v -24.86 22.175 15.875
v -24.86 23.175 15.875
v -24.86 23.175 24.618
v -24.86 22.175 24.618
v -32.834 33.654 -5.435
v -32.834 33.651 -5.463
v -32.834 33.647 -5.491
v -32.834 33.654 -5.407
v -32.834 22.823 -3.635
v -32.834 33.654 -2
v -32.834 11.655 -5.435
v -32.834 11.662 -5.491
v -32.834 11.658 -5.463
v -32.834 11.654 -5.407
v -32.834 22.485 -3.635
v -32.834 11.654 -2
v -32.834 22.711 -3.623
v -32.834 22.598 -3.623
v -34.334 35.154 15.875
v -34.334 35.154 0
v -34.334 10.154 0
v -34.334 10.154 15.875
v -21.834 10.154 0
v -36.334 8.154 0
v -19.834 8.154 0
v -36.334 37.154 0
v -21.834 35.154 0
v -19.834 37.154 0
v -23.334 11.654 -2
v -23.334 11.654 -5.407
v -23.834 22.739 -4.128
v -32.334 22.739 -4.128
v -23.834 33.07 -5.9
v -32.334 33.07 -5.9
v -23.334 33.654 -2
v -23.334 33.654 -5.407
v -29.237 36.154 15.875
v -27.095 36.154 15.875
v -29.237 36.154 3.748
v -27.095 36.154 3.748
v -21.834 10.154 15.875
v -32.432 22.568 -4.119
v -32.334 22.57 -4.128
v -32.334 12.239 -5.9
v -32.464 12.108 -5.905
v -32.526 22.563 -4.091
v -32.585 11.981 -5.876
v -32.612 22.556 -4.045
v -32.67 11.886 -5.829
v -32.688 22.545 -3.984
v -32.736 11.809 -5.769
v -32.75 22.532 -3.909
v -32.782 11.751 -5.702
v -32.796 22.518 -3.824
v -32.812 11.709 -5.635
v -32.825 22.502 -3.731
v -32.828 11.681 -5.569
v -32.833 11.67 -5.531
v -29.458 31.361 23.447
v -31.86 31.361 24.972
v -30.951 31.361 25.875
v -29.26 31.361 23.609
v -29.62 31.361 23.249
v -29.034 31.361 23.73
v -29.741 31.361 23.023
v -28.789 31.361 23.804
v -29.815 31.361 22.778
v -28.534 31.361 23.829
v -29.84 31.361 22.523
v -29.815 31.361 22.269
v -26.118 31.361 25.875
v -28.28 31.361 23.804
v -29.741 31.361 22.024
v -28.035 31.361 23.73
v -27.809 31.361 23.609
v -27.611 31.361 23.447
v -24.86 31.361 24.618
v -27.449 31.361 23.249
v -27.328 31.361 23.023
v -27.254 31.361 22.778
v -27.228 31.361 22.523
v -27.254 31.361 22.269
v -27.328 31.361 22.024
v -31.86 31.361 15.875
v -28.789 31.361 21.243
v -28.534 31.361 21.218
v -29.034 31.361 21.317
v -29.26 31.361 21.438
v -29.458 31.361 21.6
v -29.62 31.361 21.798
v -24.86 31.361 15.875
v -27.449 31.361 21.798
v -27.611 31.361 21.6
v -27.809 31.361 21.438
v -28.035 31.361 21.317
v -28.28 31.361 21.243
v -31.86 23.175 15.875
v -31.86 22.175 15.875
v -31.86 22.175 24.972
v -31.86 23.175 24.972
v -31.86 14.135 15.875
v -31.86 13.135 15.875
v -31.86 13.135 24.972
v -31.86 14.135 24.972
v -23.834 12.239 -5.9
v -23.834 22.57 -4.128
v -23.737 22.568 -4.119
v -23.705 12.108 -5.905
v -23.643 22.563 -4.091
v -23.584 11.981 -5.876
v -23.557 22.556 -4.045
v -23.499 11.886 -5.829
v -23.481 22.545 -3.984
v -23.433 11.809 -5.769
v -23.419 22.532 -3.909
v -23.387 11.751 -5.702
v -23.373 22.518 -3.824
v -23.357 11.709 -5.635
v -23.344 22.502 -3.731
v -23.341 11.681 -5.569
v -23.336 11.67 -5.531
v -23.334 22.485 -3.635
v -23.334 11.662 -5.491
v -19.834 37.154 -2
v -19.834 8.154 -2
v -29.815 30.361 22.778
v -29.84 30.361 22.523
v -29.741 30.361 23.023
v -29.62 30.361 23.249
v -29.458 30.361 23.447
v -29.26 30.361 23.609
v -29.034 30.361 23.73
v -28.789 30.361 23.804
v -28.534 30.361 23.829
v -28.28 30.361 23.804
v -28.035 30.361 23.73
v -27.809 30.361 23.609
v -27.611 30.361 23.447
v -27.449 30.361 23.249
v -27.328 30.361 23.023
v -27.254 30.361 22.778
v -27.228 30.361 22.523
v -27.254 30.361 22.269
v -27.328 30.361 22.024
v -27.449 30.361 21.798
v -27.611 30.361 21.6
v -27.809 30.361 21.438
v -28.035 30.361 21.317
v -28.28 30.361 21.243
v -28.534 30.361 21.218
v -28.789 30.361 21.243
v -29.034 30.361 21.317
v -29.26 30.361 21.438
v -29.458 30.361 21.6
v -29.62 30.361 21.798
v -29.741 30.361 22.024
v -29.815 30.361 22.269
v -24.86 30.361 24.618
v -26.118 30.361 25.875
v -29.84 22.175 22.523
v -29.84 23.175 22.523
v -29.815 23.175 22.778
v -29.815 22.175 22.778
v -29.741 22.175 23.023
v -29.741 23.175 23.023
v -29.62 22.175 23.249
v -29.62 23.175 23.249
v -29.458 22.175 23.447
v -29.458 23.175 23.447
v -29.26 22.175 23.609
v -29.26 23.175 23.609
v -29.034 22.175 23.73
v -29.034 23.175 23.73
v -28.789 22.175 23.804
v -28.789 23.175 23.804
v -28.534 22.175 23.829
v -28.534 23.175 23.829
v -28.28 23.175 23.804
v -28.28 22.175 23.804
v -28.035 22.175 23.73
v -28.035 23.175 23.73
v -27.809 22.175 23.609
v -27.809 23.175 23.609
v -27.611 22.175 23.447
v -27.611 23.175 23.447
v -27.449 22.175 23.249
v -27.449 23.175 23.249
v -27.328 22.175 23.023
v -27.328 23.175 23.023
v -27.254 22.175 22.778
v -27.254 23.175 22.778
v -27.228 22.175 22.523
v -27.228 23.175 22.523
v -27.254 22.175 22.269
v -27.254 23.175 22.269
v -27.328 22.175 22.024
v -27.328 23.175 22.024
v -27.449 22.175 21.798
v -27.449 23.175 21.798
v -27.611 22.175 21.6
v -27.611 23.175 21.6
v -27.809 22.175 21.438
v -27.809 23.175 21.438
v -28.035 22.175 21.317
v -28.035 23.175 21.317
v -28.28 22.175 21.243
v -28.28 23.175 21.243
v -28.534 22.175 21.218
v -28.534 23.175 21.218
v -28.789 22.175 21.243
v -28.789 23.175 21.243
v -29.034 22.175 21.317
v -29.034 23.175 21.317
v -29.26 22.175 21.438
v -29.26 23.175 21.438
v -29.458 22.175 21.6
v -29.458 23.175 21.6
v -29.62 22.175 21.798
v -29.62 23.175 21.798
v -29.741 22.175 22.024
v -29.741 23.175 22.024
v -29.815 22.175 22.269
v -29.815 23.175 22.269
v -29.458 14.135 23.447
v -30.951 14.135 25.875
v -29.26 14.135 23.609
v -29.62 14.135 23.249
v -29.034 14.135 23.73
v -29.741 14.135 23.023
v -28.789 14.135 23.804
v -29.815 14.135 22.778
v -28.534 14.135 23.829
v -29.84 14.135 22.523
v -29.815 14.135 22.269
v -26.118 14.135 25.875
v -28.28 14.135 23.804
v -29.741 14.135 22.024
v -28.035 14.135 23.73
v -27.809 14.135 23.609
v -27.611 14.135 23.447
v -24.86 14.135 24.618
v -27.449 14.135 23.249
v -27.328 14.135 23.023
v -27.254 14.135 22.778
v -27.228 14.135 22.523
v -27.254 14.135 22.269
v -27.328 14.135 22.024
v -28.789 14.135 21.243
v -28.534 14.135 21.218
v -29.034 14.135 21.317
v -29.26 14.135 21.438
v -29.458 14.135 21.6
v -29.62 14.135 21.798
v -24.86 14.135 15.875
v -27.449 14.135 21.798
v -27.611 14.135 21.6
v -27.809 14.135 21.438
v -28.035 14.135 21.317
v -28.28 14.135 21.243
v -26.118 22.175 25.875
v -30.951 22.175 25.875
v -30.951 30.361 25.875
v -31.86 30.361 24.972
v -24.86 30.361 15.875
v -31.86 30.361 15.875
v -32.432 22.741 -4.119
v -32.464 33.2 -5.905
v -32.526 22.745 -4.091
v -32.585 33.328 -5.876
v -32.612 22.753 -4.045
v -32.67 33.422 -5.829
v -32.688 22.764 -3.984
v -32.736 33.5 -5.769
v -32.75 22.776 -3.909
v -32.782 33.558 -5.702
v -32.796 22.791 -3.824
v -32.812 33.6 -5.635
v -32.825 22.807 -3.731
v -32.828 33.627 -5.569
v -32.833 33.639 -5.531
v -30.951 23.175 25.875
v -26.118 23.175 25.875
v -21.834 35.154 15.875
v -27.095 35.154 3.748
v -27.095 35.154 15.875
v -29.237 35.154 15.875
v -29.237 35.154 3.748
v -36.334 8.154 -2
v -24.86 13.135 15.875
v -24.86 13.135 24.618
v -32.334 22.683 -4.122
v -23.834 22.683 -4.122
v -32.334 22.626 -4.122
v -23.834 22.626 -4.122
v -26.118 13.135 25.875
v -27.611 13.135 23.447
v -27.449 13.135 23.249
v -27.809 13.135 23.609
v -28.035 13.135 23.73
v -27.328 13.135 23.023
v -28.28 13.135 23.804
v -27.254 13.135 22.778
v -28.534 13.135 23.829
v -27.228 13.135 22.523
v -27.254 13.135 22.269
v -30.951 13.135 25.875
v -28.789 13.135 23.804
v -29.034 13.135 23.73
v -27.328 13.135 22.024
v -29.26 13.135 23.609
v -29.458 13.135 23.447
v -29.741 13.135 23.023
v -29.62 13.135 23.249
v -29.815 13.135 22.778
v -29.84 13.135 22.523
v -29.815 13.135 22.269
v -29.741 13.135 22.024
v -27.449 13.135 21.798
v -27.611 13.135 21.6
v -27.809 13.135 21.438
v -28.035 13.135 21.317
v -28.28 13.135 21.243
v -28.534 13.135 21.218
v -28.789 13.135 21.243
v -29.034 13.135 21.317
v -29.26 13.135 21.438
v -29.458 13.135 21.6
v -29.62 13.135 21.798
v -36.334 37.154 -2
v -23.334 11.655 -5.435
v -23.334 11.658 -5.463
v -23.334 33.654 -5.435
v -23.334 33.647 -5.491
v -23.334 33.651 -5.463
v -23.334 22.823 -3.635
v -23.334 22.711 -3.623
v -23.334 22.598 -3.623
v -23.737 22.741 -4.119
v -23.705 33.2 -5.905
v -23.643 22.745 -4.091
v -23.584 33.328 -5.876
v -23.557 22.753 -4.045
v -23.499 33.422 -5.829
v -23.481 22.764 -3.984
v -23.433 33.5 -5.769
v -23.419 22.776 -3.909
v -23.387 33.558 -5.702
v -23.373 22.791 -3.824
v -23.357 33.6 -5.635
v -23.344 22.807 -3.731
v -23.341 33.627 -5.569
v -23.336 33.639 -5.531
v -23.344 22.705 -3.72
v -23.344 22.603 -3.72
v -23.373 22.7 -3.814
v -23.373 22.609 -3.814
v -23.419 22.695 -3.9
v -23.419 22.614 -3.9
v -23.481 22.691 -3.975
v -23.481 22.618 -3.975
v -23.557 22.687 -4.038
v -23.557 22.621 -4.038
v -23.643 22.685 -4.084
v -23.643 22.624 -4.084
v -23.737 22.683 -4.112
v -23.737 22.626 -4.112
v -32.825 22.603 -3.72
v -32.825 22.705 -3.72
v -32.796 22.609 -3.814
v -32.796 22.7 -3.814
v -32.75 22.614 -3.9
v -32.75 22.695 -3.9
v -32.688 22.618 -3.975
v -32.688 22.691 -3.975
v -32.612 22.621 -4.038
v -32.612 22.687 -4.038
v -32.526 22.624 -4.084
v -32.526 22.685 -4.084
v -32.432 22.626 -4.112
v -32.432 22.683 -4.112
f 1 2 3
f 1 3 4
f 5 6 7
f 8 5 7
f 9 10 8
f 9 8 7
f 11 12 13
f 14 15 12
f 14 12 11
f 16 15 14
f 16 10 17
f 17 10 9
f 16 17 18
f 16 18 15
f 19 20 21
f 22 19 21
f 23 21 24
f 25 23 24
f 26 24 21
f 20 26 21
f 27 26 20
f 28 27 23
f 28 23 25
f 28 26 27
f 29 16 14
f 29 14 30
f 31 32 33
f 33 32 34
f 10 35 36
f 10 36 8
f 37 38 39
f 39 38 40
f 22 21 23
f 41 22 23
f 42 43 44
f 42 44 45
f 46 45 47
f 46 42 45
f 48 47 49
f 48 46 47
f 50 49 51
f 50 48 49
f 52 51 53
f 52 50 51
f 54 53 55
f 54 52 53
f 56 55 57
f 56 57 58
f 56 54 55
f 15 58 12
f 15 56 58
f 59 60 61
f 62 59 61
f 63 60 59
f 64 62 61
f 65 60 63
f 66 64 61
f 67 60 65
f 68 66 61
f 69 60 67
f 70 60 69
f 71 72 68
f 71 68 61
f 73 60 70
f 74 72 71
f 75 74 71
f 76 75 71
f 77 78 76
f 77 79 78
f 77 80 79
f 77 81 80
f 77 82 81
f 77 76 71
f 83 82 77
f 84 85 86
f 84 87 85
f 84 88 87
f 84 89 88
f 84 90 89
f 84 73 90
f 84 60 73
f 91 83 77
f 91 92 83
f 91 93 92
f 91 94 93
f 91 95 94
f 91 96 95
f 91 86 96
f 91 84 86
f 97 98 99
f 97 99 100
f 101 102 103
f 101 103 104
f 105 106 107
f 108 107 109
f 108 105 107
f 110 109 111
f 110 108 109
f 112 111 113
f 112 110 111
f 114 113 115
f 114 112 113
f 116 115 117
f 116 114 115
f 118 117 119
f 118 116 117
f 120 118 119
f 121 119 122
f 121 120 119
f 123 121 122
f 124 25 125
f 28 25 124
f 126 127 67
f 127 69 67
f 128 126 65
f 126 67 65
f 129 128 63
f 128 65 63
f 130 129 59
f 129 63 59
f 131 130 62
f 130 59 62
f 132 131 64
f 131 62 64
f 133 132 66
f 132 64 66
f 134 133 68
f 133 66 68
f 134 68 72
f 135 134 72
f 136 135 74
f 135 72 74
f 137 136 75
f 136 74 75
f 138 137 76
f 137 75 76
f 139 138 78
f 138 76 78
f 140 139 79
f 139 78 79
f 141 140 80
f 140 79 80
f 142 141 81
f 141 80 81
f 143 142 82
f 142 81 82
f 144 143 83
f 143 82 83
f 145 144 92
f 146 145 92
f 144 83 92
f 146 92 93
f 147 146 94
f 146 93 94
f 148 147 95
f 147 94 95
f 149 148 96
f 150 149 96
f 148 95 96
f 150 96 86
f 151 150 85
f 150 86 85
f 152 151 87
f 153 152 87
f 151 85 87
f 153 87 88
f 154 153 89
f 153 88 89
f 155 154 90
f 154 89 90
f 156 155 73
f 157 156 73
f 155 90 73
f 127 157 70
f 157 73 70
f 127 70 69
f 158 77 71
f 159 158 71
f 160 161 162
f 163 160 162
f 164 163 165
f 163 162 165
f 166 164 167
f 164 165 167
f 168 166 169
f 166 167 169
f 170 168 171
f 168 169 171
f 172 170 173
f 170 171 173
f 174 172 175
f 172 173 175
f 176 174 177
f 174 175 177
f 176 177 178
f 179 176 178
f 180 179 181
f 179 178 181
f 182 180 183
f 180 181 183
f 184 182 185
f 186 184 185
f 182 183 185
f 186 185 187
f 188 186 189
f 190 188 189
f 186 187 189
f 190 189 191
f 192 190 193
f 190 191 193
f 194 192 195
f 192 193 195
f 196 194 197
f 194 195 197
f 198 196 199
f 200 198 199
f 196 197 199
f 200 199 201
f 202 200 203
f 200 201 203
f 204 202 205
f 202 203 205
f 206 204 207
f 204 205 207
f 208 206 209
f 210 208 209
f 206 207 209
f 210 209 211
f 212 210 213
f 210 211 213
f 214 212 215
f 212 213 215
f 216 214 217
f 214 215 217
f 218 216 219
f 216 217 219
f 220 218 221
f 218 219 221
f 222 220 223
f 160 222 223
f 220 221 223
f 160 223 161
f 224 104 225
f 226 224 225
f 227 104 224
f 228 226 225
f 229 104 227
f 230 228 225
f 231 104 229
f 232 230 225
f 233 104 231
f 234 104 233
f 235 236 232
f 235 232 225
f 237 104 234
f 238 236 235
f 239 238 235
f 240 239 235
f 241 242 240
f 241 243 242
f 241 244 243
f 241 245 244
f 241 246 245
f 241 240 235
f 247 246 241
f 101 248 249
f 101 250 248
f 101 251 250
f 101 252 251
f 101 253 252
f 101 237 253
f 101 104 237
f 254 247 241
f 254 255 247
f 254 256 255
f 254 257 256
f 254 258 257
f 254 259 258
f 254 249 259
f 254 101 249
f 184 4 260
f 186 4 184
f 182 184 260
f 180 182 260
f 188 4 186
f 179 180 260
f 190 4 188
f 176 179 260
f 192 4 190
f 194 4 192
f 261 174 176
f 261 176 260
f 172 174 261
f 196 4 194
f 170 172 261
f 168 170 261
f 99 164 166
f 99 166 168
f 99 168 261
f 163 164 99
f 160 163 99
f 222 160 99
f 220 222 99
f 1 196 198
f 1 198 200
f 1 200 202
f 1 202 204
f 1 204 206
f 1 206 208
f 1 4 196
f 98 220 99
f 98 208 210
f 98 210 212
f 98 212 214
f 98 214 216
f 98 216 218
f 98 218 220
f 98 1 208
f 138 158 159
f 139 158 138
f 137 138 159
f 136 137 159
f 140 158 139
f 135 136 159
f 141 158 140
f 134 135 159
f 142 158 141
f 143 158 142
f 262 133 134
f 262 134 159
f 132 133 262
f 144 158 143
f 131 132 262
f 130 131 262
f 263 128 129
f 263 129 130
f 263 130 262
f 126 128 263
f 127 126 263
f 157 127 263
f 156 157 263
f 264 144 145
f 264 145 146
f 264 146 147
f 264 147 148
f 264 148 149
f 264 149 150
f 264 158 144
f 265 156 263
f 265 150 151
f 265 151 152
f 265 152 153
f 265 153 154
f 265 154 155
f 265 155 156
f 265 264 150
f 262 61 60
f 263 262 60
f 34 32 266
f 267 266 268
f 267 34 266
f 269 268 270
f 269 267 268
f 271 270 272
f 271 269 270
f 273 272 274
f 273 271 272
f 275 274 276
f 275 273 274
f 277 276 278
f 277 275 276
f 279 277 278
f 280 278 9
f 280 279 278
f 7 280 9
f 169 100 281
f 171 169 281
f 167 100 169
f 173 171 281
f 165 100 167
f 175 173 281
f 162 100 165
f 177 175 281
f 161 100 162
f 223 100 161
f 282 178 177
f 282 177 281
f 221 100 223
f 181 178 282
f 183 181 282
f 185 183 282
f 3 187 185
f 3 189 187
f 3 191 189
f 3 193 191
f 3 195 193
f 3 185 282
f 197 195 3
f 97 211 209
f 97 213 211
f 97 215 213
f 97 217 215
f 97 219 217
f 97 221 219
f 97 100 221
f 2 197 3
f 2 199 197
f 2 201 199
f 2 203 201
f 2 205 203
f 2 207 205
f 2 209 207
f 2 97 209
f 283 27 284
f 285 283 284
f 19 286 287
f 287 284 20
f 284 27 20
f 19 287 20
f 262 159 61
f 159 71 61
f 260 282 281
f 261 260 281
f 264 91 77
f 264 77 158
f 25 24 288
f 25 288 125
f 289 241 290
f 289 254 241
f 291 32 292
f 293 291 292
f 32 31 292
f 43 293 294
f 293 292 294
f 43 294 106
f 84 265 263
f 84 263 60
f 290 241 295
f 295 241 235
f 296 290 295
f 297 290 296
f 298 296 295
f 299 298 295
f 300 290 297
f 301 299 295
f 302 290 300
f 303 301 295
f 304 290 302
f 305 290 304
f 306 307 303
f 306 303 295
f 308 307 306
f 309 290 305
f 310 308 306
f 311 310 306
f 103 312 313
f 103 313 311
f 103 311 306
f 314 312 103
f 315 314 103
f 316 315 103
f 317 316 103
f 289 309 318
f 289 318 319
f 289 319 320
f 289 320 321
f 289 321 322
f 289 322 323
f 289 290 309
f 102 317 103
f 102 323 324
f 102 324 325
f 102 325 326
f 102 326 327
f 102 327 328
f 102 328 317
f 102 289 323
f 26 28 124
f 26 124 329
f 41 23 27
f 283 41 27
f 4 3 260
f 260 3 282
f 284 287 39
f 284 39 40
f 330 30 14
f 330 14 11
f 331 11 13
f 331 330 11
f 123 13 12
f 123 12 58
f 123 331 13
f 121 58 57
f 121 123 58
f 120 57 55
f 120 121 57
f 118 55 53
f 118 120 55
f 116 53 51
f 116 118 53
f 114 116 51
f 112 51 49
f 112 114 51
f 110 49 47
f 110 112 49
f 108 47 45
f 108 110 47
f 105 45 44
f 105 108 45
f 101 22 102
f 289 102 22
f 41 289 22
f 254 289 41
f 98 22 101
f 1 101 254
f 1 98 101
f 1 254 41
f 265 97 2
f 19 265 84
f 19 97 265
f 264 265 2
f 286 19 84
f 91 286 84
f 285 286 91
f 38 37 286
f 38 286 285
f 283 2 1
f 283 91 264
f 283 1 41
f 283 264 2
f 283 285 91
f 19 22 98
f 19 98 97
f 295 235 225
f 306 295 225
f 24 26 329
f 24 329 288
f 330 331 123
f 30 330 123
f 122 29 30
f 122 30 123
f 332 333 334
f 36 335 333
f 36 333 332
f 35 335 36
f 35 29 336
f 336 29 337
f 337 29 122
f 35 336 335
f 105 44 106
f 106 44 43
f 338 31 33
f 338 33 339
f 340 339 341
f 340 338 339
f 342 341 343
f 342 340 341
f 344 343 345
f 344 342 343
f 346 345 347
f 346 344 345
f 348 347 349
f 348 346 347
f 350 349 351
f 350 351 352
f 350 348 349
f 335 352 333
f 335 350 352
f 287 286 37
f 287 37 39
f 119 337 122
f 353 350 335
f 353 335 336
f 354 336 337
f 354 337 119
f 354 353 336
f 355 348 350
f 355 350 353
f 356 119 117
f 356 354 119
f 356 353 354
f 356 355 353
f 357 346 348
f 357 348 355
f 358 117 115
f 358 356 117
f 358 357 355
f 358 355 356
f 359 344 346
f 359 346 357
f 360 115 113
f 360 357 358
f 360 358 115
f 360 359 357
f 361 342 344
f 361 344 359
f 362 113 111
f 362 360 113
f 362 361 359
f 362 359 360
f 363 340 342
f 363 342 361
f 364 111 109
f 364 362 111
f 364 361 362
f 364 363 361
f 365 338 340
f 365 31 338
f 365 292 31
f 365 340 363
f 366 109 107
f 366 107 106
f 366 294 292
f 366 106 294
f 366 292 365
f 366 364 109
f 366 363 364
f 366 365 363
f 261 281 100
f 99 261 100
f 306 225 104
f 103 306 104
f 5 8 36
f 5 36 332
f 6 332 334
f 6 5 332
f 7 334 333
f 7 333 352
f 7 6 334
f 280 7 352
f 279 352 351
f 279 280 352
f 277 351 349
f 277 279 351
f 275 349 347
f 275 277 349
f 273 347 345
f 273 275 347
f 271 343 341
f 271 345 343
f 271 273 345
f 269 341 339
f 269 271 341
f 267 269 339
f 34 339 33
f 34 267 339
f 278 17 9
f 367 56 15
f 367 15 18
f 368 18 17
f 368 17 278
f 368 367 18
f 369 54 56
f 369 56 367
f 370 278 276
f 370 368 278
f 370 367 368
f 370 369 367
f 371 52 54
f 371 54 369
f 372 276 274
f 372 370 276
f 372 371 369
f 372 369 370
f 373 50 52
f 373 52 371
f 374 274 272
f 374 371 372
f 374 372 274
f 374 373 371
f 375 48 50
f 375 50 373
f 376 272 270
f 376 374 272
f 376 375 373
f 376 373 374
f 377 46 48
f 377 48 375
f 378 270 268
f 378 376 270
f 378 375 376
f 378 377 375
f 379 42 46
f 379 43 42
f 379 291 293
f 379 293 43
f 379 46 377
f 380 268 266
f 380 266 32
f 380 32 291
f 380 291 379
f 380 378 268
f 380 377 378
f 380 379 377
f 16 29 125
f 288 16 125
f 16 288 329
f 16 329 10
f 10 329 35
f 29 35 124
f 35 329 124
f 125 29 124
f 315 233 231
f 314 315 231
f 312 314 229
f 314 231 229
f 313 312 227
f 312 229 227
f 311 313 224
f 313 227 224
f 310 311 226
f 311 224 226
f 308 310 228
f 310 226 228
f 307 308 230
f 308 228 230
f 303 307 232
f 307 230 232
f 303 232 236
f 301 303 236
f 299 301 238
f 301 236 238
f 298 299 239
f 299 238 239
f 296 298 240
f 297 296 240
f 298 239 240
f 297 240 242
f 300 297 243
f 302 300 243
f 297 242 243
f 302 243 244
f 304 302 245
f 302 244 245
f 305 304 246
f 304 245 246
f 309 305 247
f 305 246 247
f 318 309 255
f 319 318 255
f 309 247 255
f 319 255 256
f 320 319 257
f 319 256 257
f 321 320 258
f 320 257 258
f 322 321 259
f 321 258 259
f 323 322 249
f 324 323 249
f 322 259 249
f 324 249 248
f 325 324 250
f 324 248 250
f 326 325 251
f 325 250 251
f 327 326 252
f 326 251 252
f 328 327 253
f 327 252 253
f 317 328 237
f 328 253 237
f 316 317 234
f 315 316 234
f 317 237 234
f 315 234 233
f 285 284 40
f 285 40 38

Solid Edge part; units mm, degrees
sketch "Sketch1" plane through (0, 0, 0) normal (0, 0, 1) x (1, 0, 0)
  line L0 (-34.3345, 10.1544) -> (-21.8345, 10.1544)
  line L1 (-21.8345, 10.1544) -> (-21.8345, 35.1544)
  line L2 (-21.8345, 35.1544) -> (-34.3345, 35.1544)
  line L3 (-34.3345, 35.1544) -> (-34.3345, 10.1544)
  dimension "D1" = 12.5
  dimension "D2" = 25
extrude "Protrusion1" add sketch "Sketch1" along normal blind 15.875
sketch "Sketch2" plane through (-28.0845, 22.6544, 0) normal (0, 0, -1) x (1, 0, 0)
  line L0 (-8.25, -14.5) -> (-8.25, 14.5)
  line L1 (-8.25, 14.5) -> (8.25, 14.5)
  line L2 (8.25, 14.5) -> (8.25, -14.5)
  line L3 (8.25, -14.5) -> (-8.25, -14.5)
  dimension "D1" = 2
extrude "ExtrudedProtrusion_2" add sketch "Sketch2" along normal blind 2
sketch "Sketch3" plane through (-28.0845, 22.6544, -2) normal (0, 0, -1) x (1, 0, 0)
  line L0 (-4.75, -11) -> (-4.75, 11)
  line L1 (-4.75, 11) -> (4.75, 11)
  line L2 (4.75, 11) -> (4.75, -11)
  line L3 (4.75, -11) -> (-4.75, -11)
  dimension "D1" = 1.5
extrude "ExtrudedProtrusion_3" add sketch "Sketch3" along normal blind 4
sketch "Sketch4" plane through (-32.8345, 22.6544, -4) normal (-1, 0, 0) x (0, 1, 0)
  line L0 (-11, 2) -> (0, 0.1136)
  line L1 (0, 0.1136) -> (11, 2)
extrude "Cutout1" cut sketch "Sketch4" against normal through all material side at (-32.8345, 17.1629, -5.1061)
fillet "Round_1" radius 0.5 7 edges at (-28.0845, 11.6544, -6) (-23.3345, 17.1544, -5.0568) (-28.0845, 22.6544, -4.1136) (-23.3345, 28.1544, -5.0568) (-28.0845, 33.6544, -6) (-32.8345, 28.1544, -5.0568) (-32.8345, 17.1544, -5.0568)
sketch "Sketch5" plane through (-28.0845, 22.6544, 15.875) normal (0, 0, 1) x (-1, 0, 0)
  line L0 (-3.2242, 0.4798) -> (3.7758, 0.4798)
  line L1 (3.7758, 0.4798) -> (3.7758, -0.5202)
  line L2 (3.7758, -0.5202) -> (-3.2242, -0.5202)
  line L3 (-3.2242, -0.5202) -> (-3.2242, 0.4798)
  line L4 (-3.2242, -7.7065) -> (3.7758, -7.7065)
  line L5 (3.7758, -7.7065) -> (3.7758, -8.7065)
  line L6 (3.7758, -8.7065) -> (-3.2242, -8.7065)
  line L7 (-3.2242, -8.7065) -> (-3.2242, -7.7065)
  line L8 (-3.2242, 9.5196) -> (3.7758, 9.5196)
  line L9 (3.7758, 9.5196) -> (3.7758, 8.5196)
  line L10 (3.7758, 8.5196) -> (-3.2242, 8.5196)
  line L11 (-3.2242, 8.5196) -> (-3.2242, 9.5196)
  dimension "D1" = 7
  dimension "D2" = 1
extrude "ExtrudedProtrusion_4" add sketch "Sketch5" along normal blind 10
sketch "Sketch6" plane through (-28.3603, 31.361, 20.875) normal (0, 1, 0) x (-1, 0, 0)
  line L0 (-4.074, 3.1687) -> (-1.2897, 5.953)
  line L1 (-1.2897, 5.953) -> (1.6313, 5.953)
  line L2 (1.6313, 5.953) -> (4.2278, 3.3737)
extrude "Cutout2" cut sketch "Sketch6" against normal through all material side at (-25.6431, 31.361, 25.4712)
sketch "Sketch7" plane through (-28.3603, 31.361, 20.875) normal (0, 1, 0) x (-1, 0, 0)
  circle A0 centre (0.174, 1.6484) radius 1.3058
extrude "Cutout3" cut sketch "Sketch7" against normal through all
sketch "Sketch8" plane through (-28.0845, 35.1544, 7.9375) normal (0, 1, 0) x (1, 0, 0)
  line L0 (0.9898, -7.9375) -> (-1.1525, -7.9375)
  line L1 (-1.1525, -7.9375) -> (-1.1525, 4.1896)
  line L2 (-1.1525, 4.1896) -> (0.9898, 4.1896)
  line L3 (0.9898, 4.1896) -> (0.9898, -7.9375)
extrude "ExtrudedProtrusion_5" add sketch "Sketch8" along normal blind 1
